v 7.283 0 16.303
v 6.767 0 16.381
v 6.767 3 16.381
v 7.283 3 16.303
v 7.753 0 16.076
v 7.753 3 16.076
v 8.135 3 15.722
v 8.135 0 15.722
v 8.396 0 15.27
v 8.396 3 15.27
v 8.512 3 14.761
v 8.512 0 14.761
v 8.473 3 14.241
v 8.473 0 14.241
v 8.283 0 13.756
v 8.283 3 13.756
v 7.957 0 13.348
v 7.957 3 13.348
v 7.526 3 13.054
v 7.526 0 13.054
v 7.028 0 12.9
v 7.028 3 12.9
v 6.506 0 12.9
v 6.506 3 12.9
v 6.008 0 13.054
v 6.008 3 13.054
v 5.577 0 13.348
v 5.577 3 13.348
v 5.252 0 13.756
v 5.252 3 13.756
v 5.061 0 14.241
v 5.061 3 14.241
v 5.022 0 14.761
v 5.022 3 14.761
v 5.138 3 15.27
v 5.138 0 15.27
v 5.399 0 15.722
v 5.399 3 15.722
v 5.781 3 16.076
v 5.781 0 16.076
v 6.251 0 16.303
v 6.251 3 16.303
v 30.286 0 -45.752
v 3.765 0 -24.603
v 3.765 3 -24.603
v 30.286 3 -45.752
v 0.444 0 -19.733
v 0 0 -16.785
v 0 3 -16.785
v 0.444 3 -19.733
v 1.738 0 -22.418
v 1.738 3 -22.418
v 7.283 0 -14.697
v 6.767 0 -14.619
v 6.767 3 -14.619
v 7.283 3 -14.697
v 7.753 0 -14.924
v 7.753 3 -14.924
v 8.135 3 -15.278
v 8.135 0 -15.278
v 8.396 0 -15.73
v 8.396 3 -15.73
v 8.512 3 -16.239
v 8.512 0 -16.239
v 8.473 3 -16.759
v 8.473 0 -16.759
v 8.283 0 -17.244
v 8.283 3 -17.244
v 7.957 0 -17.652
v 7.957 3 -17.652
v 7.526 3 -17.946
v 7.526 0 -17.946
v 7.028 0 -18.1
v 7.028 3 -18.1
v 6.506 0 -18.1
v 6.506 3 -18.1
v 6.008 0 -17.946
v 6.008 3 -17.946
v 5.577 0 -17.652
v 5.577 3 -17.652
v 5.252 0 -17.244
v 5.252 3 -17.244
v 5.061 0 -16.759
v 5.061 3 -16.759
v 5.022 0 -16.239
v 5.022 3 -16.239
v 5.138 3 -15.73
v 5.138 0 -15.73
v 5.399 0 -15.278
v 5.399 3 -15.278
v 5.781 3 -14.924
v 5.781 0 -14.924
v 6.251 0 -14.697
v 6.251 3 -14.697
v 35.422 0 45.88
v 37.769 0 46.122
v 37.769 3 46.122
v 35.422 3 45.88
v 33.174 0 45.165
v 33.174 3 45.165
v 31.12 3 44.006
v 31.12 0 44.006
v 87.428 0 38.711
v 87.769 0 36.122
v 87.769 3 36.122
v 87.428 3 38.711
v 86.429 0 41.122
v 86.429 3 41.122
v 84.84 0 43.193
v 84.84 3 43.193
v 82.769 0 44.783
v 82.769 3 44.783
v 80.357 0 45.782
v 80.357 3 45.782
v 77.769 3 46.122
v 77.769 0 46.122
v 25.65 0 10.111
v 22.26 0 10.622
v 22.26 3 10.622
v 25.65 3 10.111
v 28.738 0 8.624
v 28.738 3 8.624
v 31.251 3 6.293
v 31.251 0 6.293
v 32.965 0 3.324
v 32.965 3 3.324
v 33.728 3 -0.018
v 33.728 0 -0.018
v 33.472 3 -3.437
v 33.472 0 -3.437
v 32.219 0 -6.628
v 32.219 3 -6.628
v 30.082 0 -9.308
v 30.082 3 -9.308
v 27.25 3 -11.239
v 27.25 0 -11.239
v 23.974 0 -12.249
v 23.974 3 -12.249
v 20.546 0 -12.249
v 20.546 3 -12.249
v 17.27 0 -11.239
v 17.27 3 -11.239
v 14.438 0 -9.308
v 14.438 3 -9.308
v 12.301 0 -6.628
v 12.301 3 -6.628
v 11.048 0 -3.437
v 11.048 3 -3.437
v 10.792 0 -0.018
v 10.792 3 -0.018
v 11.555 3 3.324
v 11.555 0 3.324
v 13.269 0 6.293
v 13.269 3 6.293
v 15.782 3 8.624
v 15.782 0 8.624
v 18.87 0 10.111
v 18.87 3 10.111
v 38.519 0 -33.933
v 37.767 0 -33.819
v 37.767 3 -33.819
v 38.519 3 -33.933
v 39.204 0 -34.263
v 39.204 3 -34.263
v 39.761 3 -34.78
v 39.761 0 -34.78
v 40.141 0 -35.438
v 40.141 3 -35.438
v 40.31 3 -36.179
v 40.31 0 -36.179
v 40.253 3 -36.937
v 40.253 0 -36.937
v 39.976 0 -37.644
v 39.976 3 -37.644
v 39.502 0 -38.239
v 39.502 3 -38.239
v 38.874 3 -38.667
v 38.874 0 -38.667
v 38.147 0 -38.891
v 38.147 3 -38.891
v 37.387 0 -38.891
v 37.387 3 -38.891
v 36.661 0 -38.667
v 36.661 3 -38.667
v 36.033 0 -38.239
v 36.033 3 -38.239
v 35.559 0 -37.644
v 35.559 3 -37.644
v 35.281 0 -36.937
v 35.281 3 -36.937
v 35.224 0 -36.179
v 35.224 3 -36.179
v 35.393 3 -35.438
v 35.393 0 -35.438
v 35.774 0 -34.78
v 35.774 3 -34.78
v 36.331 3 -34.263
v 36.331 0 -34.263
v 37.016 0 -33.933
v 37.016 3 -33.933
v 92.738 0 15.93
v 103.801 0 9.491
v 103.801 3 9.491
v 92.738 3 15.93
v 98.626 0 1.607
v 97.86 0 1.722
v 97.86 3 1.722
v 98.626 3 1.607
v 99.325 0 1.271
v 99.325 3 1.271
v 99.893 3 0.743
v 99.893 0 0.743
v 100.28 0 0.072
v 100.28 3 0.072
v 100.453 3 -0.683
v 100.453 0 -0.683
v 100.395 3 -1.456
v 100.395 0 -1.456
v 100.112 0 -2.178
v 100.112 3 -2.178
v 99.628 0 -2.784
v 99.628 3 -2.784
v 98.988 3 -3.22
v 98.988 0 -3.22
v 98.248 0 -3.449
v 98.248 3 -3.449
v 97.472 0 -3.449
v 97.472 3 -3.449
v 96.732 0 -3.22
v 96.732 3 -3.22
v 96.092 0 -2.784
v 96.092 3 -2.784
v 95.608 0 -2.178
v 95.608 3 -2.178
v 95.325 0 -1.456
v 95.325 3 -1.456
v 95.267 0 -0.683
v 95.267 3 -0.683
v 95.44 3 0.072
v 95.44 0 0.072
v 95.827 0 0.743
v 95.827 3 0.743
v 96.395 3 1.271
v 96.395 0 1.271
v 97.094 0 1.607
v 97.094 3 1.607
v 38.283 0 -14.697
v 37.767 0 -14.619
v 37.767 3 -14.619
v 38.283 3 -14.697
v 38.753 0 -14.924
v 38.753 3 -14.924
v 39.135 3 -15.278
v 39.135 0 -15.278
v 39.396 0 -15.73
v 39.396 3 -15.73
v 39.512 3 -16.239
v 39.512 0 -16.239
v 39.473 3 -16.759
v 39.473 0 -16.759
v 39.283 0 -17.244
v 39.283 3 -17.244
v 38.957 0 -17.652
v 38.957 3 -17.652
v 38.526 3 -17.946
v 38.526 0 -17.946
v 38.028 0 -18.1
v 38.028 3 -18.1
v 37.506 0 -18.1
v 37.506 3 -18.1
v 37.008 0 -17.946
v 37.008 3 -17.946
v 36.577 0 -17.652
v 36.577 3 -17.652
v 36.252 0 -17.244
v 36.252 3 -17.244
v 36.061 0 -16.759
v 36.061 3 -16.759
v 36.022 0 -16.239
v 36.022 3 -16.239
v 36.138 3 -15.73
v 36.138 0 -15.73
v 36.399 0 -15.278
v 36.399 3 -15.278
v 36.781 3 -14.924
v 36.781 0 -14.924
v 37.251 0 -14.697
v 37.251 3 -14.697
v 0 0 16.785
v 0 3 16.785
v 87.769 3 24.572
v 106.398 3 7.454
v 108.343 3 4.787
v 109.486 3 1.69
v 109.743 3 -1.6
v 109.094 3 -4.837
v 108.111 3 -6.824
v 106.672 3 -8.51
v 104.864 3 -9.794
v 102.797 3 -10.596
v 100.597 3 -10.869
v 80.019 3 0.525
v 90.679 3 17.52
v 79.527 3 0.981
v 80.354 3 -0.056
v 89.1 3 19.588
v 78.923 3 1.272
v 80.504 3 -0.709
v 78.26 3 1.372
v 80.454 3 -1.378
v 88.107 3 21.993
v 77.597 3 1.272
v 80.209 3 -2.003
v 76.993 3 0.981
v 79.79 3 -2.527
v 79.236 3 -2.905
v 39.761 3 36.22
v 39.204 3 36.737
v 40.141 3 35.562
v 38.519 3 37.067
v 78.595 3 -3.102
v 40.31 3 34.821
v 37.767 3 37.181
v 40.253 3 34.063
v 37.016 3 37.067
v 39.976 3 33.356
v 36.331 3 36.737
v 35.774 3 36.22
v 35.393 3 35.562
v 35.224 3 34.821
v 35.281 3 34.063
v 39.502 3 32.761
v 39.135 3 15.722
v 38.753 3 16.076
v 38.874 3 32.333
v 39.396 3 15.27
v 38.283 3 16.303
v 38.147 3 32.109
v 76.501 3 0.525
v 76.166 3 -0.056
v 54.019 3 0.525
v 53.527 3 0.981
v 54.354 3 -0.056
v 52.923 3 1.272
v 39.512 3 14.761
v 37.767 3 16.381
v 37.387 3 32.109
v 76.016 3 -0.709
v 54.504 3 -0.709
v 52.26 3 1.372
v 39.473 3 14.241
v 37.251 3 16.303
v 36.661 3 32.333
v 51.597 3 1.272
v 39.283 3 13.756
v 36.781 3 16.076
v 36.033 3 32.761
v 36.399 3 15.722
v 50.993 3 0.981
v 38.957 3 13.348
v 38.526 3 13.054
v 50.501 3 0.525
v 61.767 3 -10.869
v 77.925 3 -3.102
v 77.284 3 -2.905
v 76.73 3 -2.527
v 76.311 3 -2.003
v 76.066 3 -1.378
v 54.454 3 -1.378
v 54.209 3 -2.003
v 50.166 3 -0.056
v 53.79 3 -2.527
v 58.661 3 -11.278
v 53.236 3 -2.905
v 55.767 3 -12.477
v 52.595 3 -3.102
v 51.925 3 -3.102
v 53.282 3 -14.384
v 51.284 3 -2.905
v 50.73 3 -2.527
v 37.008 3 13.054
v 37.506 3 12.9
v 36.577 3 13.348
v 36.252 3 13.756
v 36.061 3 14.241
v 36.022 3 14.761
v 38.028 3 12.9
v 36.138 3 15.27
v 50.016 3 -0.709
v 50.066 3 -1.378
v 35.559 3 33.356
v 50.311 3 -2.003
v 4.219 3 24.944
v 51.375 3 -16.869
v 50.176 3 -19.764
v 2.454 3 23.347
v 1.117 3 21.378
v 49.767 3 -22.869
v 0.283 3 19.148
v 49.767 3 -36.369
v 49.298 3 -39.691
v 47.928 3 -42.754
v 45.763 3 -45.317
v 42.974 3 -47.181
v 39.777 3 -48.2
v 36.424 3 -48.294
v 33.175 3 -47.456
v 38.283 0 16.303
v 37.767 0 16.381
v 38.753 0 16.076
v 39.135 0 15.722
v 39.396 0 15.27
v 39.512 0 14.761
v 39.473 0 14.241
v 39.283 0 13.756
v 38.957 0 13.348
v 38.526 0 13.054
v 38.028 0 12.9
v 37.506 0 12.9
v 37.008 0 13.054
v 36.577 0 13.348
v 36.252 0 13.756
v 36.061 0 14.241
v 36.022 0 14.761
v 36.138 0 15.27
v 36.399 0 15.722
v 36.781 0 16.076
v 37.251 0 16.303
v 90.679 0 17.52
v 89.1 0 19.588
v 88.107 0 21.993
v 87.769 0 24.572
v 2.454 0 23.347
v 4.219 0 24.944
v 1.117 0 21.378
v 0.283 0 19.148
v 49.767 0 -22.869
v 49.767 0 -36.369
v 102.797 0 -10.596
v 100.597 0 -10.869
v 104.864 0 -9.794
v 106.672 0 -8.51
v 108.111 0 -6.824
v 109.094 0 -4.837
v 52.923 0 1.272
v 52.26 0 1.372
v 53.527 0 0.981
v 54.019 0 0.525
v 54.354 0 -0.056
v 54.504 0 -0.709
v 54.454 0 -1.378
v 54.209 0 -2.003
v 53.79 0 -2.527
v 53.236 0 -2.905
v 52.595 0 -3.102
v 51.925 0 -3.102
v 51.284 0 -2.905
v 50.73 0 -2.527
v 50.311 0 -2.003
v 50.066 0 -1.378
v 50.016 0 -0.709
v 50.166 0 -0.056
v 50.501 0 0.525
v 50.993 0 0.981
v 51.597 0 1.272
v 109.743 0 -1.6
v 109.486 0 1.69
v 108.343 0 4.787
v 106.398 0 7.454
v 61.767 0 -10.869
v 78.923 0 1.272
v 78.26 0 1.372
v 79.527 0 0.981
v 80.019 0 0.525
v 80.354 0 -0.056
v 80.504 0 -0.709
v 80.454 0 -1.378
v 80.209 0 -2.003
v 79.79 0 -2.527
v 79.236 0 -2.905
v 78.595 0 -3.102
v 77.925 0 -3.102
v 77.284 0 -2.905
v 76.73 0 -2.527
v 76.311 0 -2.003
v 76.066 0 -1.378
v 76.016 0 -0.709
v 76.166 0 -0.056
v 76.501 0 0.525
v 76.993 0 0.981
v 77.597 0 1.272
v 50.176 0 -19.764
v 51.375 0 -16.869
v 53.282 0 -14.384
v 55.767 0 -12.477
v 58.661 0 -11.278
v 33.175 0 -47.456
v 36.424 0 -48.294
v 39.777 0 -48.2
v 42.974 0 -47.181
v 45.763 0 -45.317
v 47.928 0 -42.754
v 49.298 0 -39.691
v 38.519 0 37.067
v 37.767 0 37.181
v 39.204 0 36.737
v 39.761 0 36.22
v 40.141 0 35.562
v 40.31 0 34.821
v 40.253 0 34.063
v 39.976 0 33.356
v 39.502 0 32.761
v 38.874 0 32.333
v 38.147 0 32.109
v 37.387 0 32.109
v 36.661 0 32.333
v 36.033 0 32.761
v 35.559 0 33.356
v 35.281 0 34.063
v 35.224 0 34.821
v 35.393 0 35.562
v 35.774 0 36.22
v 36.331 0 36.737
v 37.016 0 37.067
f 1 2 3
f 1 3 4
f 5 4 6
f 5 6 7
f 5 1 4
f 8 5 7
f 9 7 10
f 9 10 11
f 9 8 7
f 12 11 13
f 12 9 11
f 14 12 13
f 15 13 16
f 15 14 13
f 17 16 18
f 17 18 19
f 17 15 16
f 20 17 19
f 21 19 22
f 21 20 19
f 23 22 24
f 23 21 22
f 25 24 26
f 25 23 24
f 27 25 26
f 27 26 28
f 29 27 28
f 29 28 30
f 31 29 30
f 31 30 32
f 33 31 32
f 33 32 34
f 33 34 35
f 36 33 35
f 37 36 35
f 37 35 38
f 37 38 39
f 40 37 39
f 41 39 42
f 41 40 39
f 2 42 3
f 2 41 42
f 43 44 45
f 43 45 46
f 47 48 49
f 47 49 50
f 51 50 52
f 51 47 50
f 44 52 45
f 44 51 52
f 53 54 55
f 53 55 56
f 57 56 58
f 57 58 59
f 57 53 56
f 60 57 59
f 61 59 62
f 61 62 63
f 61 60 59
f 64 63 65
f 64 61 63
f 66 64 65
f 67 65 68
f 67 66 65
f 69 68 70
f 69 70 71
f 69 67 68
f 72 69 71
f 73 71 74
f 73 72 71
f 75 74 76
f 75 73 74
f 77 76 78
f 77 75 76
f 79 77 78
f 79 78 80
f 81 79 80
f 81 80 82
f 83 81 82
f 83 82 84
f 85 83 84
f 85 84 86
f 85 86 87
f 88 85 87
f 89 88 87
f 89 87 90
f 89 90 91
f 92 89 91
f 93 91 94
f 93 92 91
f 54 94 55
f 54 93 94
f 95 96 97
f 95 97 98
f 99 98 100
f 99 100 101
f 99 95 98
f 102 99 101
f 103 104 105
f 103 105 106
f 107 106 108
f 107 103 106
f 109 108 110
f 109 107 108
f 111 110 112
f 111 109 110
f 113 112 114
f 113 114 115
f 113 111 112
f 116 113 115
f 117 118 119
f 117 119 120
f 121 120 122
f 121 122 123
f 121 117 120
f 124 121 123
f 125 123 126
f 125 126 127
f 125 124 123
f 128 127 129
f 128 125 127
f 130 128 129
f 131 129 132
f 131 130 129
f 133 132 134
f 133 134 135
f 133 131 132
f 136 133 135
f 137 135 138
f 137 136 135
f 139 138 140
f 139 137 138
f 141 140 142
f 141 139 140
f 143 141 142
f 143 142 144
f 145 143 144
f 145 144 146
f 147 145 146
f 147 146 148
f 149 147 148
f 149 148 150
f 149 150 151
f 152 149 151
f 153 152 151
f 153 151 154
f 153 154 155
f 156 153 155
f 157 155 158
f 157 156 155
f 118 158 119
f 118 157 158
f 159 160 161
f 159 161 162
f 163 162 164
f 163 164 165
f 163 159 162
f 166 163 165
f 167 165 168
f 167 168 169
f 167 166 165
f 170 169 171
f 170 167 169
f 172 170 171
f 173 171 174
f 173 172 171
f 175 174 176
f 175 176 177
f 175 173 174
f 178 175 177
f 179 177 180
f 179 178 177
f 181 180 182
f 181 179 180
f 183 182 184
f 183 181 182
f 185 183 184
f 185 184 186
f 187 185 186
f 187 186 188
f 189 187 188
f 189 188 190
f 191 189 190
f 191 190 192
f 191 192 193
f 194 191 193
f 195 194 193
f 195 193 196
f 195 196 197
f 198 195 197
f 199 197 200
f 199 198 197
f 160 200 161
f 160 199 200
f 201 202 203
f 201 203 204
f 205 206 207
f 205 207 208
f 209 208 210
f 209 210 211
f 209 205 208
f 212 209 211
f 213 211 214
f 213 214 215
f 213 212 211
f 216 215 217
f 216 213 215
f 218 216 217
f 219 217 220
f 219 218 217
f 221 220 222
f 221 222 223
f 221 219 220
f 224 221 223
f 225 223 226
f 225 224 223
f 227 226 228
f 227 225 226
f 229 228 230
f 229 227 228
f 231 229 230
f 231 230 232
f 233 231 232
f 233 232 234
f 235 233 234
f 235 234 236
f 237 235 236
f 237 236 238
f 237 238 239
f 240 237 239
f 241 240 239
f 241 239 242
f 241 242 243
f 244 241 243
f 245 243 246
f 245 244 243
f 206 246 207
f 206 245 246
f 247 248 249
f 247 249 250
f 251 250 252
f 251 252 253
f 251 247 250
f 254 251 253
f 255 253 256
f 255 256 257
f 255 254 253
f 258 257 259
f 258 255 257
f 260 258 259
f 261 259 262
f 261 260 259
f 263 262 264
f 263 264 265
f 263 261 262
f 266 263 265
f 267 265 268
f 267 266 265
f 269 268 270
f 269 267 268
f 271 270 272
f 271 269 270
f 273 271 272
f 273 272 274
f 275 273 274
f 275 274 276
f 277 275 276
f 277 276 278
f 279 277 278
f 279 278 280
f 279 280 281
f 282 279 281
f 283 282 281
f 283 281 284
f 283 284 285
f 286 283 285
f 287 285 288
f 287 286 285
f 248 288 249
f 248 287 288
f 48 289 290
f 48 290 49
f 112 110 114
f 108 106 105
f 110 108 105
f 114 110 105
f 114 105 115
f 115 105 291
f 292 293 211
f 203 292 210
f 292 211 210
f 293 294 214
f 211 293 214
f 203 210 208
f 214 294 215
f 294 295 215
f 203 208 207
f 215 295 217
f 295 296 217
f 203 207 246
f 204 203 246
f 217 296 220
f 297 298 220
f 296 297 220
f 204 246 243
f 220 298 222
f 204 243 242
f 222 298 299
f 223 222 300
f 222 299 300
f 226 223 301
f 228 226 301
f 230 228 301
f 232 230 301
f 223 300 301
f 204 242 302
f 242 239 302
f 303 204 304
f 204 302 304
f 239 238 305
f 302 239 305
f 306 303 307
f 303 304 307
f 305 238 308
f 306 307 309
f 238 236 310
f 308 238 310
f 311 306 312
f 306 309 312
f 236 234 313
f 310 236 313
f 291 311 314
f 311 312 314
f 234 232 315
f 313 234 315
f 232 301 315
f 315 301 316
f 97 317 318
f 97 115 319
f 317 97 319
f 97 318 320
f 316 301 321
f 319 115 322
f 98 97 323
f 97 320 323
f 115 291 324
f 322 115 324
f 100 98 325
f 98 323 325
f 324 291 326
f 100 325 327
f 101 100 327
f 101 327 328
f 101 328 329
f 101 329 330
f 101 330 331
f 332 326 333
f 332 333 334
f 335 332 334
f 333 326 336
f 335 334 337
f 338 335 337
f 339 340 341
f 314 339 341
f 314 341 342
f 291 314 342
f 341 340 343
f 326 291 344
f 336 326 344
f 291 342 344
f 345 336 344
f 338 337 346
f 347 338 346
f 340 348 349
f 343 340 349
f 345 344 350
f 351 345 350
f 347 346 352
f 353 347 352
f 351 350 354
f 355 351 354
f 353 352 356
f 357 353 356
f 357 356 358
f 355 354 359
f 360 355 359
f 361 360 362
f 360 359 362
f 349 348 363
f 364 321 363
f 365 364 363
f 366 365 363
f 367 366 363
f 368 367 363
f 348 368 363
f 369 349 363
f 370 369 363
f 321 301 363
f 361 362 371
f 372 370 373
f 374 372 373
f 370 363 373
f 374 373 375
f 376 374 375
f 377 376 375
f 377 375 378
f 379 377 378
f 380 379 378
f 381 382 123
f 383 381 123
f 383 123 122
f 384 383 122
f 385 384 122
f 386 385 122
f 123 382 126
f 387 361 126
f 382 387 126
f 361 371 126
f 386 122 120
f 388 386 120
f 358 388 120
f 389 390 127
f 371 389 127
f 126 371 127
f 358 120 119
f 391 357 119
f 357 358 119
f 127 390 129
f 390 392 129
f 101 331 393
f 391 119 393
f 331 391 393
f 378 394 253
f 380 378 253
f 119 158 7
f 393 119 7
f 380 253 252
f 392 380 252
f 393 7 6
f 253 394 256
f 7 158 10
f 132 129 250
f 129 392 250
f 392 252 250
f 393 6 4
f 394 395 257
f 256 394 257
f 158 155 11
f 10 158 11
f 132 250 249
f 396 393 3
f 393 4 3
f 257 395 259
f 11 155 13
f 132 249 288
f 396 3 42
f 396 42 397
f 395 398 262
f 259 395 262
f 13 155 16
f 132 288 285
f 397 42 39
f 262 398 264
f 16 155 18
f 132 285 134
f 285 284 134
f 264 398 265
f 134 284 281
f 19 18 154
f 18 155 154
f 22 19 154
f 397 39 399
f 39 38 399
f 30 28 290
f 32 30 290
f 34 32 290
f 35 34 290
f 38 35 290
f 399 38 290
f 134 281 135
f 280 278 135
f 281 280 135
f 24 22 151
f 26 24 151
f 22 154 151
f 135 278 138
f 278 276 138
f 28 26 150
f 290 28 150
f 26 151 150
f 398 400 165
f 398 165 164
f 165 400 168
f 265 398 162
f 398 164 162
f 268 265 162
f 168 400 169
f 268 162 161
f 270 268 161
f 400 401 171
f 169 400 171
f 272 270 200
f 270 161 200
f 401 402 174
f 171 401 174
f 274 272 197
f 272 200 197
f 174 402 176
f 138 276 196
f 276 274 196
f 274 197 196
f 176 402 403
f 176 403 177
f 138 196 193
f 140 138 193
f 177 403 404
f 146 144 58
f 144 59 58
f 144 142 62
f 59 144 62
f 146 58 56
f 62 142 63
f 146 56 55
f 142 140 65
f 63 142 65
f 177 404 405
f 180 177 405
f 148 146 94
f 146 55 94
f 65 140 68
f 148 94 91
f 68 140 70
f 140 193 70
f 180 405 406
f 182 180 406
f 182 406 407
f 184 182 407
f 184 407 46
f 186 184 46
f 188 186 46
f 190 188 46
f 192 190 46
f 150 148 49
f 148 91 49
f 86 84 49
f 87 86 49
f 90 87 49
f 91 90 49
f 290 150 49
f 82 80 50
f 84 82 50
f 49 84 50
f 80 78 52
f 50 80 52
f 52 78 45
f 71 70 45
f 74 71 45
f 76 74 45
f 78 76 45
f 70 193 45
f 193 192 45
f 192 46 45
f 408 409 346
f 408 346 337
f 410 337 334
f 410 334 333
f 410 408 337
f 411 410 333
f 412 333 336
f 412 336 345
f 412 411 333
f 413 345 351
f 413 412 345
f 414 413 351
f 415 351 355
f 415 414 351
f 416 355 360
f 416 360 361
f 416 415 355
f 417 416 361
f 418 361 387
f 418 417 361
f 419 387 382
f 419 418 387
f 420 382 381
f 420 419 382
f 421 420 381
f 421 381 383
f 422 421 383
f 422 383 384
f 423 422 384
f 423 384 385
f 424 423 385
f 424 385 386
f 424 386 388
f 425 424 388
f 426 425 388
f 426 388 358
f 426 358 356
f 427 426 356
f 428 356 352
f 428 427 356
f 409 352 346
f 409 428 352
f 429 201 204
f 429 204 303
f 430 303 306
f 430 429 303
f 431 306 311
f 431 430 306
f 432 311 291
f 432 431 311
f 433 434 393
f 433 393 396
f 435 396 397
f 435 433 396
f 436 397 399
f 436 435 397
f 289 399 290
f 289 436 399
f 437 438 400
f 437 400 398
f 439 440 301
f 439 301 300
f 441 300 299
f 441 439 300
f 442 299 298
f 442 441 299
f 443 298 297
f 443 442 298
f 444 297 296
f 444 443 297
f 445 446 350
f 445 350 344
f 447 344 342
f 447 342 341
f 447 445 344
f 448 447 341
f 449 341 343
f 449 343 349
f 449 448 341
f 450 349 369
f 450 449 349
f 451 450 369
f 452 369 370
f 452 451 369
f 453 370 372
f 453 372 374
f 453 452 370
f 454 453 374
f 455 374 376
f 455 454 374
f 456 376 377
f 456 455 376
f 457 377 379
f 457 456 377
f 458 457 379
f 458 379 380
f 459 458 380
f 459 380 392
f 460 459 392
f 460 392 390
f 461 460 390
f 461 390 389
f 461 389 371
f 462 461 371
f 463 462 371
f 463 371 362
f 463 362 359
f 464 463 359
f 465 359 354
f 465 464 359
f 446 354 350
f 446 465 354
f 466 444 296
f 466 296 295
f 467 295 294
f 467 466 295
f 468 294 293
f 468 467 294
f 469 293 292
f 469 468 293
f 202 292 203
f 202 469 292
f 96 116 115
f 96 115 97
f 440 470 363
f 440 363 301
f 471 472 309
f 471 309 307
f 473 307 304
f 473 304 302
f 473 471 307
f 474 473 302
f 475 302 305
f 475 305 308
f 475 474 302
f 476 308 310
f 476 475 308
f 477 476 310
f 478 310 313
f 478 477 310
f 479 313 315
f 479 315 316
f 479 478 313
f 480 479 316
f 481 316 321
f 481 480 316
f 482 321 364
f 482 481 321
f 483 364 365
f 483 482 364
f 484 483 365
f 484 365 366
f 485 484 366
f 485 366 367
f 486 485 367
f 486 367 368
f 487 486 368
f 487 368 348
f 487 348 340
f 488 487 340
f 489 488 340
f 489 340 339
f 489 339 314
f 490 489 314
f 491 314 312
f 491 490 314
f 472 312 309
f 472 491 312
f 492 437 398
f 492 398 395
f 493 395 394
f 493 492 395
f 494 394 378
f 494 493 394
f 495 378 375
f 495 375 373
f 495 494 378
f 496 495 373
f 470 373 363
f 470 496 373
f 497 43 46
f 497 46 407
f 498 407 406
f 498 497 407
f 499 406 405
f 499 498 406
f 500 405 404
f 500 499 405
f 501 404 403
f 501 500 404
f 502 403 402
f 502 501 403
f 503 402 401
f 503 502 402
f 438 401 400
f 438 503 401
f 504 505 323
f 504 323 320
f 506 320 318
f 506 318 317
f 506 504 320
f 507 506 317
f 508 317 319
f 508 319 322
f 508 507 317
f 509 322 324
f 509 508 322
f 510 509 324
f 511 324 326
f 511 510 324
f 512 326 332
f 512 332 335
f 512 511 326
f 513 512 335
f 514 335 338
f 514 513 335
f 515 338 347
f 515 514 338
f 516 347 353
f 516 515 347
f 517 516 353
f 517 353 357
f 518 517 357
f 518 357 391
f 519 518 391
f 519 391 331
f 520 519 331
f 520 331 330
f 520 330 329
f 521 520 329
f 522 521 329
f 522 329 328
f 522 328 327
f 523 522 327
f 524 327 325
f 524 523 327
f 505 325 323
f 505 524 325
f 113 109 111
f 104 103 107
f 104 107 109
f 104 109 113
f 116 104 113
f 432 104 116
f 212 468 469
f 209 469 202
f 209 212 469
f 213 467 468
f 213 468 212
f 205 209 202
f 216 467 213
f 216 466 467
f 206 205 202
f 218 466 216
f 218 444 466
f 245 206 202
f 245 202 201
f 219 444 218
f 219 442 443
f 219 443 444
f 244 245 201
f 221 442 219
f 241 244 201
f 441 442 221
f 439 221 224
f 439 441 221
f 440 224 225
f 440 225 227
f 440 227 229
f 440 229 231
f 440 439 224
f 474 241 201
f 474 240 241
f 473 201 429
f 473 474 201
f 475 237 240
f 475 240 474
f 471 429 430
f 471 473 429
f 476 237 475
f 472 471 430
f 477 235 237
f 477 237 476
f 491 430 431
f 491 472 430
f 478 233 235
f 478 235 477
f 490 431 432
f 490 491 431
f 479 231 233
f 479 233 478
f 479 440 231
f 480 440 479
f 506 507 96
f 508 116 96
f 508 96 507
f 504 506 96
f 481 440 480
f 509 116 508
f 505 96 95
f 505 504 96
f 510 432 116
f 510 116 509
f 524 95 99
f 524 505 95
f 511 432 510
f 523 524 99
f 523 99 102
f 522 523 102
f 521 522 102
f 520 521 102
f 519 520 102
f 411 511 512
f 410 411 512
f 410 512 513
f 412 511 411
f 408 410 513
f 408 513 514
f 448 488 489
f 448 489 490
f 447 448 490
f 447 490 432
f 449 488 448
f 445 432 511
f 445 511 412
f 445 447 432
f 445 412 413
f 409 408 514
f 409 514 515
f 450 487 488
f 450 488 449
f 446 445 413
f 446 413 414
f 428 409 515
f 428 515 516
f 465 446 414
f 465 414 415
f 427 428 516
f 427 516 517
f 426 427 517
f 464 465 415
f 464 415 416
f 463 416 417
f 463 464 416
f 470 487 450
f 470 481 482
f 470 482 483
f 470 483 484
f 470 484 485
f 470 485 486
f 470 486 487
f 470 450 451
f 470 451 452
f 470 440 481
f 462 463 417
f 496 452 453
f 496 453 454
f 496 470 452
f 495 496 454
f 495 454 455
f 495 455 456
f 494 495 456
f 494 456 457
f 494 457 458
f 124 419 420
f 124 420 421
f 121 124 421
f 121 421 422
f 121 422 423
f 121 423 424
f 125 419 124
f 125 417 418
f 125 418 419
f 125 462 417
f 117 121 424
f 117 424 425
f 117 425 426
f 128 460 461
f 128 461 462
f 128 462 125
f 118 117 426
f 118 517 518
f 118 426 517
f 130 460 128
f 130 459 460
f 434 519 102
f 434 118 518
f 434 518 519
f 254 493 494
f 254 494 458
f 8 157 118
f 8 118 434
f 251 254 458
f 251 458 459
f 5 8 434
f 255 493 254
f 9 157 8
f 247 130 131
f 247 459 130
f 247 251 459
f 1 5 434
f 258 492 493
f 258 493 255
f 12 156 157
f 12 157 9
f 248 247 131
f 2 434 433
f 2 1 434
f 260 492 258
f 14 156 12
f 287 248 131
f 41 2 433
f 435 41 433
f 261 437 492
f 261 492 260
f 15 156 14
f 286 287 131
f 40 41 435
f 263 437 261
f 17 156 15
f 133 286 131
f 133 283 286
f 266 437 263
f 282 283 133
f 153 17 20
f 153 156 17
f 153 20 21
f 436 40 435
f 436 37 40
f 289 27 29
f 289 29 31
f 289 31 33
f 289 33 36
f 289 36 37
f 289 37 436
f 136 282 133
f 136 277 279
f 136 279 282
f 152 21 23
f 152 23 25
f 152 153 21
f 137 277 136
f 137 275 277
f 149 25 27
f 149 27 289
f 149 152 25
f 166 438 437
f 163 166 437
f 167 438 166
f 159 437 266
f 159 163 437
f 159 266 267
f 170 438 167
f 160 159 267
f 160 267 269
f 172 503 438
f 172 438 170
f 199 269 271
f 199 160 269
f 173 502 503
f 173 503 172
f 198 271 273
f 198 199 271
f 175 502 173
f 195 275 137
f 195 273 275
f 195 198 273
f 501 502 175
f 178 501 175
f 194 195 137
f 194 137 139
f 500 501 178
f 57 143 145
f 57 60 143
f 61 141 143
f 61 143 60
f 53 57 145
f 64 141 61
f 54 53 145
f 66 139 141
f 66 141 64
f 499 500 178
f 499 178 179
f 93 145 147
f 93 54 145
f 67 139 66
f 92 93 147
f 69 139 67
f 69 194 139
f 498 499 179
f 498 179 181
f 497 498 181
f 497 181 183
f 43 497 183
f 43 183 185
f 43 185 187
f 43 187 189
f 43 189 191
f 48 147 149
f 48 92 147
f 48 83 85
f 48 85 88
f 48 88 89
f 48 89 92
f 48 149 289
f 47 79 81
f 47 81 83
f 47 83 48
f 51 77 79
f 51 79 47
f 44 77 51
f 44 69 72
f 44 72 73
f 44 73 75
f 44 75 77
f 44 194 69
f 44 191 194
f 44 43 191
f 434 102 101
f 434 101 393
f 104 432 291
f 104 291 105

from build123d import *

# Parameters (mm, degrees)
SKETCH2_R           = 2.55
SKETCH2_R_2         = 1.75
SKETCH2_R_3         = 11.5
SKETCH2_R_4         = 2.25
SKETCH2_R_5         = 2.6
BOSS_EXTRUDE1_DEPTH = 3


with BuildPart() as part:
    # Sketch2 → Boss-Extrude1 (new body)
    with BuildSketch(Plane(origin=(0, 0, 0), x_dir=(1, 0, 0), z_dir=(0, 1, 0))):
        with BuildLine():
            Line((0, -16.785), (0, 16.785))
            ThreePointArc((0, 16.785), (0.990365412, 21.123949711), (3.76529692, 24.603470279))
            Line((3.76529692, 24.603470279), (30.285548105, 45.751583128))
            ThreePointArc((30.285548105, 45.751583128), (42.973931455, 47.180980298), (49.767191801, 36.369418793))
            Line((49.767191801, 36.369418793), (49.767191801, 22.869418793))
            ThreePointArc((49.767191801, 22.869418793), (53.281910427, 14.384137419), (61.767191801, 10.869418793))
            Line((61.767191801, 10.869418793), (100.597191801, 10.869418793))
            ThreePointArc((100.597191801, 10.869418793), (105.807473987, 9.207876366), (109.093955082, 4.836743136))
            ThreePointArc((109.093955082, 4.836743136), (109.021446628, -3.277934075), (103.801176734, -9.490986945))
            Line((103.801176734, -9.490986945), (92.738459269, -15.929642261))
            ThreePointArc((92.738459269, -15.929642261), (89.099691246, -19.587512883), (87.768658735, -24.572390281))
            Line((87.768658735, -24.572390281), (87.768658735, -36.122390281))
            ThreePointArc((87.768658735, -36.122390281), (84.839726547, -43.193458093), (77.768658735, -46.122390281))
            Line((77.768658735, -46.122390281), (37.768658735, -46.122390281))
            ThreePointArc((37.768658735, -46.122390281), (34.279940347, -45.58043956), (31.120041688, -44.005667499))
            Line((31.120041688, -44.005667499), (4.218593872, -24.944371494))
            ThreePointArc((4.218593872, -24.944371494), (1.117037057, -21.377708281), (0, -16.785))
        make_face()
        with Locations(Location((37.767191801, 36.369418793, 0), (0, 0, 270))):
            Circle(SKETCH2_R, mode=Mode.SUBTRACT)
        with Locations(Location((37.767191801, 16.369418793, 0), (0, 0, 270))):
            Circle(SKETCH2_R_2, mode=Mode.SUBTRACT)
        with Locations(Location((22.26, 0.877609719, 0), (0, 0, 270))):
            Circle(SKETCH2_R_3, mode=Mode.SUBTRACT)
        with Locations(Location((37.767191801, -14.630581207, 0), (0, 0, 270))):
            Circle(SKETCH2_R_2, mode=Mode.SUBTRACT)
        with Locations(Location((6.767191801, -14.630581207, 0), (0, 0, 270))):
            Circle(SKETCH2_R_2, mode=Mode.SUBTRACT)
        with Locations(Location((6.767191801, 16.369418793, 0), (0, 0, 270))):
            Circle(SKETCH2_R_2, mode=Mode.SUBTRACT)
        with Locations(Location((52.26, 0.877609719, 0), (0, 0, 270))):
            Circle(SKETCH2_R_4, mode=Mode.SUBTRACT)
        with Locations(Location((78.26, 0.877609719, 0), (0, 0, 270))):
            Circle(SKETCH2_R_4, mode=Mode.SUBTRACT)
        with Locations(Location((97.86, 0.877609719, 0), (0, 0, 270))):
            Circle(SKETCH2_R_5, mode=Mode.SUBTRACT)
        with Locations(Location((37.767191801, -34.630581207, 0), (0, 0, 270))):
            Circle(SKETCH2_R, mode=Mode.SUBTRACT)
    extrude(amount=BOSS_EXTRUDE1_DEPTH)


solid = part.part
